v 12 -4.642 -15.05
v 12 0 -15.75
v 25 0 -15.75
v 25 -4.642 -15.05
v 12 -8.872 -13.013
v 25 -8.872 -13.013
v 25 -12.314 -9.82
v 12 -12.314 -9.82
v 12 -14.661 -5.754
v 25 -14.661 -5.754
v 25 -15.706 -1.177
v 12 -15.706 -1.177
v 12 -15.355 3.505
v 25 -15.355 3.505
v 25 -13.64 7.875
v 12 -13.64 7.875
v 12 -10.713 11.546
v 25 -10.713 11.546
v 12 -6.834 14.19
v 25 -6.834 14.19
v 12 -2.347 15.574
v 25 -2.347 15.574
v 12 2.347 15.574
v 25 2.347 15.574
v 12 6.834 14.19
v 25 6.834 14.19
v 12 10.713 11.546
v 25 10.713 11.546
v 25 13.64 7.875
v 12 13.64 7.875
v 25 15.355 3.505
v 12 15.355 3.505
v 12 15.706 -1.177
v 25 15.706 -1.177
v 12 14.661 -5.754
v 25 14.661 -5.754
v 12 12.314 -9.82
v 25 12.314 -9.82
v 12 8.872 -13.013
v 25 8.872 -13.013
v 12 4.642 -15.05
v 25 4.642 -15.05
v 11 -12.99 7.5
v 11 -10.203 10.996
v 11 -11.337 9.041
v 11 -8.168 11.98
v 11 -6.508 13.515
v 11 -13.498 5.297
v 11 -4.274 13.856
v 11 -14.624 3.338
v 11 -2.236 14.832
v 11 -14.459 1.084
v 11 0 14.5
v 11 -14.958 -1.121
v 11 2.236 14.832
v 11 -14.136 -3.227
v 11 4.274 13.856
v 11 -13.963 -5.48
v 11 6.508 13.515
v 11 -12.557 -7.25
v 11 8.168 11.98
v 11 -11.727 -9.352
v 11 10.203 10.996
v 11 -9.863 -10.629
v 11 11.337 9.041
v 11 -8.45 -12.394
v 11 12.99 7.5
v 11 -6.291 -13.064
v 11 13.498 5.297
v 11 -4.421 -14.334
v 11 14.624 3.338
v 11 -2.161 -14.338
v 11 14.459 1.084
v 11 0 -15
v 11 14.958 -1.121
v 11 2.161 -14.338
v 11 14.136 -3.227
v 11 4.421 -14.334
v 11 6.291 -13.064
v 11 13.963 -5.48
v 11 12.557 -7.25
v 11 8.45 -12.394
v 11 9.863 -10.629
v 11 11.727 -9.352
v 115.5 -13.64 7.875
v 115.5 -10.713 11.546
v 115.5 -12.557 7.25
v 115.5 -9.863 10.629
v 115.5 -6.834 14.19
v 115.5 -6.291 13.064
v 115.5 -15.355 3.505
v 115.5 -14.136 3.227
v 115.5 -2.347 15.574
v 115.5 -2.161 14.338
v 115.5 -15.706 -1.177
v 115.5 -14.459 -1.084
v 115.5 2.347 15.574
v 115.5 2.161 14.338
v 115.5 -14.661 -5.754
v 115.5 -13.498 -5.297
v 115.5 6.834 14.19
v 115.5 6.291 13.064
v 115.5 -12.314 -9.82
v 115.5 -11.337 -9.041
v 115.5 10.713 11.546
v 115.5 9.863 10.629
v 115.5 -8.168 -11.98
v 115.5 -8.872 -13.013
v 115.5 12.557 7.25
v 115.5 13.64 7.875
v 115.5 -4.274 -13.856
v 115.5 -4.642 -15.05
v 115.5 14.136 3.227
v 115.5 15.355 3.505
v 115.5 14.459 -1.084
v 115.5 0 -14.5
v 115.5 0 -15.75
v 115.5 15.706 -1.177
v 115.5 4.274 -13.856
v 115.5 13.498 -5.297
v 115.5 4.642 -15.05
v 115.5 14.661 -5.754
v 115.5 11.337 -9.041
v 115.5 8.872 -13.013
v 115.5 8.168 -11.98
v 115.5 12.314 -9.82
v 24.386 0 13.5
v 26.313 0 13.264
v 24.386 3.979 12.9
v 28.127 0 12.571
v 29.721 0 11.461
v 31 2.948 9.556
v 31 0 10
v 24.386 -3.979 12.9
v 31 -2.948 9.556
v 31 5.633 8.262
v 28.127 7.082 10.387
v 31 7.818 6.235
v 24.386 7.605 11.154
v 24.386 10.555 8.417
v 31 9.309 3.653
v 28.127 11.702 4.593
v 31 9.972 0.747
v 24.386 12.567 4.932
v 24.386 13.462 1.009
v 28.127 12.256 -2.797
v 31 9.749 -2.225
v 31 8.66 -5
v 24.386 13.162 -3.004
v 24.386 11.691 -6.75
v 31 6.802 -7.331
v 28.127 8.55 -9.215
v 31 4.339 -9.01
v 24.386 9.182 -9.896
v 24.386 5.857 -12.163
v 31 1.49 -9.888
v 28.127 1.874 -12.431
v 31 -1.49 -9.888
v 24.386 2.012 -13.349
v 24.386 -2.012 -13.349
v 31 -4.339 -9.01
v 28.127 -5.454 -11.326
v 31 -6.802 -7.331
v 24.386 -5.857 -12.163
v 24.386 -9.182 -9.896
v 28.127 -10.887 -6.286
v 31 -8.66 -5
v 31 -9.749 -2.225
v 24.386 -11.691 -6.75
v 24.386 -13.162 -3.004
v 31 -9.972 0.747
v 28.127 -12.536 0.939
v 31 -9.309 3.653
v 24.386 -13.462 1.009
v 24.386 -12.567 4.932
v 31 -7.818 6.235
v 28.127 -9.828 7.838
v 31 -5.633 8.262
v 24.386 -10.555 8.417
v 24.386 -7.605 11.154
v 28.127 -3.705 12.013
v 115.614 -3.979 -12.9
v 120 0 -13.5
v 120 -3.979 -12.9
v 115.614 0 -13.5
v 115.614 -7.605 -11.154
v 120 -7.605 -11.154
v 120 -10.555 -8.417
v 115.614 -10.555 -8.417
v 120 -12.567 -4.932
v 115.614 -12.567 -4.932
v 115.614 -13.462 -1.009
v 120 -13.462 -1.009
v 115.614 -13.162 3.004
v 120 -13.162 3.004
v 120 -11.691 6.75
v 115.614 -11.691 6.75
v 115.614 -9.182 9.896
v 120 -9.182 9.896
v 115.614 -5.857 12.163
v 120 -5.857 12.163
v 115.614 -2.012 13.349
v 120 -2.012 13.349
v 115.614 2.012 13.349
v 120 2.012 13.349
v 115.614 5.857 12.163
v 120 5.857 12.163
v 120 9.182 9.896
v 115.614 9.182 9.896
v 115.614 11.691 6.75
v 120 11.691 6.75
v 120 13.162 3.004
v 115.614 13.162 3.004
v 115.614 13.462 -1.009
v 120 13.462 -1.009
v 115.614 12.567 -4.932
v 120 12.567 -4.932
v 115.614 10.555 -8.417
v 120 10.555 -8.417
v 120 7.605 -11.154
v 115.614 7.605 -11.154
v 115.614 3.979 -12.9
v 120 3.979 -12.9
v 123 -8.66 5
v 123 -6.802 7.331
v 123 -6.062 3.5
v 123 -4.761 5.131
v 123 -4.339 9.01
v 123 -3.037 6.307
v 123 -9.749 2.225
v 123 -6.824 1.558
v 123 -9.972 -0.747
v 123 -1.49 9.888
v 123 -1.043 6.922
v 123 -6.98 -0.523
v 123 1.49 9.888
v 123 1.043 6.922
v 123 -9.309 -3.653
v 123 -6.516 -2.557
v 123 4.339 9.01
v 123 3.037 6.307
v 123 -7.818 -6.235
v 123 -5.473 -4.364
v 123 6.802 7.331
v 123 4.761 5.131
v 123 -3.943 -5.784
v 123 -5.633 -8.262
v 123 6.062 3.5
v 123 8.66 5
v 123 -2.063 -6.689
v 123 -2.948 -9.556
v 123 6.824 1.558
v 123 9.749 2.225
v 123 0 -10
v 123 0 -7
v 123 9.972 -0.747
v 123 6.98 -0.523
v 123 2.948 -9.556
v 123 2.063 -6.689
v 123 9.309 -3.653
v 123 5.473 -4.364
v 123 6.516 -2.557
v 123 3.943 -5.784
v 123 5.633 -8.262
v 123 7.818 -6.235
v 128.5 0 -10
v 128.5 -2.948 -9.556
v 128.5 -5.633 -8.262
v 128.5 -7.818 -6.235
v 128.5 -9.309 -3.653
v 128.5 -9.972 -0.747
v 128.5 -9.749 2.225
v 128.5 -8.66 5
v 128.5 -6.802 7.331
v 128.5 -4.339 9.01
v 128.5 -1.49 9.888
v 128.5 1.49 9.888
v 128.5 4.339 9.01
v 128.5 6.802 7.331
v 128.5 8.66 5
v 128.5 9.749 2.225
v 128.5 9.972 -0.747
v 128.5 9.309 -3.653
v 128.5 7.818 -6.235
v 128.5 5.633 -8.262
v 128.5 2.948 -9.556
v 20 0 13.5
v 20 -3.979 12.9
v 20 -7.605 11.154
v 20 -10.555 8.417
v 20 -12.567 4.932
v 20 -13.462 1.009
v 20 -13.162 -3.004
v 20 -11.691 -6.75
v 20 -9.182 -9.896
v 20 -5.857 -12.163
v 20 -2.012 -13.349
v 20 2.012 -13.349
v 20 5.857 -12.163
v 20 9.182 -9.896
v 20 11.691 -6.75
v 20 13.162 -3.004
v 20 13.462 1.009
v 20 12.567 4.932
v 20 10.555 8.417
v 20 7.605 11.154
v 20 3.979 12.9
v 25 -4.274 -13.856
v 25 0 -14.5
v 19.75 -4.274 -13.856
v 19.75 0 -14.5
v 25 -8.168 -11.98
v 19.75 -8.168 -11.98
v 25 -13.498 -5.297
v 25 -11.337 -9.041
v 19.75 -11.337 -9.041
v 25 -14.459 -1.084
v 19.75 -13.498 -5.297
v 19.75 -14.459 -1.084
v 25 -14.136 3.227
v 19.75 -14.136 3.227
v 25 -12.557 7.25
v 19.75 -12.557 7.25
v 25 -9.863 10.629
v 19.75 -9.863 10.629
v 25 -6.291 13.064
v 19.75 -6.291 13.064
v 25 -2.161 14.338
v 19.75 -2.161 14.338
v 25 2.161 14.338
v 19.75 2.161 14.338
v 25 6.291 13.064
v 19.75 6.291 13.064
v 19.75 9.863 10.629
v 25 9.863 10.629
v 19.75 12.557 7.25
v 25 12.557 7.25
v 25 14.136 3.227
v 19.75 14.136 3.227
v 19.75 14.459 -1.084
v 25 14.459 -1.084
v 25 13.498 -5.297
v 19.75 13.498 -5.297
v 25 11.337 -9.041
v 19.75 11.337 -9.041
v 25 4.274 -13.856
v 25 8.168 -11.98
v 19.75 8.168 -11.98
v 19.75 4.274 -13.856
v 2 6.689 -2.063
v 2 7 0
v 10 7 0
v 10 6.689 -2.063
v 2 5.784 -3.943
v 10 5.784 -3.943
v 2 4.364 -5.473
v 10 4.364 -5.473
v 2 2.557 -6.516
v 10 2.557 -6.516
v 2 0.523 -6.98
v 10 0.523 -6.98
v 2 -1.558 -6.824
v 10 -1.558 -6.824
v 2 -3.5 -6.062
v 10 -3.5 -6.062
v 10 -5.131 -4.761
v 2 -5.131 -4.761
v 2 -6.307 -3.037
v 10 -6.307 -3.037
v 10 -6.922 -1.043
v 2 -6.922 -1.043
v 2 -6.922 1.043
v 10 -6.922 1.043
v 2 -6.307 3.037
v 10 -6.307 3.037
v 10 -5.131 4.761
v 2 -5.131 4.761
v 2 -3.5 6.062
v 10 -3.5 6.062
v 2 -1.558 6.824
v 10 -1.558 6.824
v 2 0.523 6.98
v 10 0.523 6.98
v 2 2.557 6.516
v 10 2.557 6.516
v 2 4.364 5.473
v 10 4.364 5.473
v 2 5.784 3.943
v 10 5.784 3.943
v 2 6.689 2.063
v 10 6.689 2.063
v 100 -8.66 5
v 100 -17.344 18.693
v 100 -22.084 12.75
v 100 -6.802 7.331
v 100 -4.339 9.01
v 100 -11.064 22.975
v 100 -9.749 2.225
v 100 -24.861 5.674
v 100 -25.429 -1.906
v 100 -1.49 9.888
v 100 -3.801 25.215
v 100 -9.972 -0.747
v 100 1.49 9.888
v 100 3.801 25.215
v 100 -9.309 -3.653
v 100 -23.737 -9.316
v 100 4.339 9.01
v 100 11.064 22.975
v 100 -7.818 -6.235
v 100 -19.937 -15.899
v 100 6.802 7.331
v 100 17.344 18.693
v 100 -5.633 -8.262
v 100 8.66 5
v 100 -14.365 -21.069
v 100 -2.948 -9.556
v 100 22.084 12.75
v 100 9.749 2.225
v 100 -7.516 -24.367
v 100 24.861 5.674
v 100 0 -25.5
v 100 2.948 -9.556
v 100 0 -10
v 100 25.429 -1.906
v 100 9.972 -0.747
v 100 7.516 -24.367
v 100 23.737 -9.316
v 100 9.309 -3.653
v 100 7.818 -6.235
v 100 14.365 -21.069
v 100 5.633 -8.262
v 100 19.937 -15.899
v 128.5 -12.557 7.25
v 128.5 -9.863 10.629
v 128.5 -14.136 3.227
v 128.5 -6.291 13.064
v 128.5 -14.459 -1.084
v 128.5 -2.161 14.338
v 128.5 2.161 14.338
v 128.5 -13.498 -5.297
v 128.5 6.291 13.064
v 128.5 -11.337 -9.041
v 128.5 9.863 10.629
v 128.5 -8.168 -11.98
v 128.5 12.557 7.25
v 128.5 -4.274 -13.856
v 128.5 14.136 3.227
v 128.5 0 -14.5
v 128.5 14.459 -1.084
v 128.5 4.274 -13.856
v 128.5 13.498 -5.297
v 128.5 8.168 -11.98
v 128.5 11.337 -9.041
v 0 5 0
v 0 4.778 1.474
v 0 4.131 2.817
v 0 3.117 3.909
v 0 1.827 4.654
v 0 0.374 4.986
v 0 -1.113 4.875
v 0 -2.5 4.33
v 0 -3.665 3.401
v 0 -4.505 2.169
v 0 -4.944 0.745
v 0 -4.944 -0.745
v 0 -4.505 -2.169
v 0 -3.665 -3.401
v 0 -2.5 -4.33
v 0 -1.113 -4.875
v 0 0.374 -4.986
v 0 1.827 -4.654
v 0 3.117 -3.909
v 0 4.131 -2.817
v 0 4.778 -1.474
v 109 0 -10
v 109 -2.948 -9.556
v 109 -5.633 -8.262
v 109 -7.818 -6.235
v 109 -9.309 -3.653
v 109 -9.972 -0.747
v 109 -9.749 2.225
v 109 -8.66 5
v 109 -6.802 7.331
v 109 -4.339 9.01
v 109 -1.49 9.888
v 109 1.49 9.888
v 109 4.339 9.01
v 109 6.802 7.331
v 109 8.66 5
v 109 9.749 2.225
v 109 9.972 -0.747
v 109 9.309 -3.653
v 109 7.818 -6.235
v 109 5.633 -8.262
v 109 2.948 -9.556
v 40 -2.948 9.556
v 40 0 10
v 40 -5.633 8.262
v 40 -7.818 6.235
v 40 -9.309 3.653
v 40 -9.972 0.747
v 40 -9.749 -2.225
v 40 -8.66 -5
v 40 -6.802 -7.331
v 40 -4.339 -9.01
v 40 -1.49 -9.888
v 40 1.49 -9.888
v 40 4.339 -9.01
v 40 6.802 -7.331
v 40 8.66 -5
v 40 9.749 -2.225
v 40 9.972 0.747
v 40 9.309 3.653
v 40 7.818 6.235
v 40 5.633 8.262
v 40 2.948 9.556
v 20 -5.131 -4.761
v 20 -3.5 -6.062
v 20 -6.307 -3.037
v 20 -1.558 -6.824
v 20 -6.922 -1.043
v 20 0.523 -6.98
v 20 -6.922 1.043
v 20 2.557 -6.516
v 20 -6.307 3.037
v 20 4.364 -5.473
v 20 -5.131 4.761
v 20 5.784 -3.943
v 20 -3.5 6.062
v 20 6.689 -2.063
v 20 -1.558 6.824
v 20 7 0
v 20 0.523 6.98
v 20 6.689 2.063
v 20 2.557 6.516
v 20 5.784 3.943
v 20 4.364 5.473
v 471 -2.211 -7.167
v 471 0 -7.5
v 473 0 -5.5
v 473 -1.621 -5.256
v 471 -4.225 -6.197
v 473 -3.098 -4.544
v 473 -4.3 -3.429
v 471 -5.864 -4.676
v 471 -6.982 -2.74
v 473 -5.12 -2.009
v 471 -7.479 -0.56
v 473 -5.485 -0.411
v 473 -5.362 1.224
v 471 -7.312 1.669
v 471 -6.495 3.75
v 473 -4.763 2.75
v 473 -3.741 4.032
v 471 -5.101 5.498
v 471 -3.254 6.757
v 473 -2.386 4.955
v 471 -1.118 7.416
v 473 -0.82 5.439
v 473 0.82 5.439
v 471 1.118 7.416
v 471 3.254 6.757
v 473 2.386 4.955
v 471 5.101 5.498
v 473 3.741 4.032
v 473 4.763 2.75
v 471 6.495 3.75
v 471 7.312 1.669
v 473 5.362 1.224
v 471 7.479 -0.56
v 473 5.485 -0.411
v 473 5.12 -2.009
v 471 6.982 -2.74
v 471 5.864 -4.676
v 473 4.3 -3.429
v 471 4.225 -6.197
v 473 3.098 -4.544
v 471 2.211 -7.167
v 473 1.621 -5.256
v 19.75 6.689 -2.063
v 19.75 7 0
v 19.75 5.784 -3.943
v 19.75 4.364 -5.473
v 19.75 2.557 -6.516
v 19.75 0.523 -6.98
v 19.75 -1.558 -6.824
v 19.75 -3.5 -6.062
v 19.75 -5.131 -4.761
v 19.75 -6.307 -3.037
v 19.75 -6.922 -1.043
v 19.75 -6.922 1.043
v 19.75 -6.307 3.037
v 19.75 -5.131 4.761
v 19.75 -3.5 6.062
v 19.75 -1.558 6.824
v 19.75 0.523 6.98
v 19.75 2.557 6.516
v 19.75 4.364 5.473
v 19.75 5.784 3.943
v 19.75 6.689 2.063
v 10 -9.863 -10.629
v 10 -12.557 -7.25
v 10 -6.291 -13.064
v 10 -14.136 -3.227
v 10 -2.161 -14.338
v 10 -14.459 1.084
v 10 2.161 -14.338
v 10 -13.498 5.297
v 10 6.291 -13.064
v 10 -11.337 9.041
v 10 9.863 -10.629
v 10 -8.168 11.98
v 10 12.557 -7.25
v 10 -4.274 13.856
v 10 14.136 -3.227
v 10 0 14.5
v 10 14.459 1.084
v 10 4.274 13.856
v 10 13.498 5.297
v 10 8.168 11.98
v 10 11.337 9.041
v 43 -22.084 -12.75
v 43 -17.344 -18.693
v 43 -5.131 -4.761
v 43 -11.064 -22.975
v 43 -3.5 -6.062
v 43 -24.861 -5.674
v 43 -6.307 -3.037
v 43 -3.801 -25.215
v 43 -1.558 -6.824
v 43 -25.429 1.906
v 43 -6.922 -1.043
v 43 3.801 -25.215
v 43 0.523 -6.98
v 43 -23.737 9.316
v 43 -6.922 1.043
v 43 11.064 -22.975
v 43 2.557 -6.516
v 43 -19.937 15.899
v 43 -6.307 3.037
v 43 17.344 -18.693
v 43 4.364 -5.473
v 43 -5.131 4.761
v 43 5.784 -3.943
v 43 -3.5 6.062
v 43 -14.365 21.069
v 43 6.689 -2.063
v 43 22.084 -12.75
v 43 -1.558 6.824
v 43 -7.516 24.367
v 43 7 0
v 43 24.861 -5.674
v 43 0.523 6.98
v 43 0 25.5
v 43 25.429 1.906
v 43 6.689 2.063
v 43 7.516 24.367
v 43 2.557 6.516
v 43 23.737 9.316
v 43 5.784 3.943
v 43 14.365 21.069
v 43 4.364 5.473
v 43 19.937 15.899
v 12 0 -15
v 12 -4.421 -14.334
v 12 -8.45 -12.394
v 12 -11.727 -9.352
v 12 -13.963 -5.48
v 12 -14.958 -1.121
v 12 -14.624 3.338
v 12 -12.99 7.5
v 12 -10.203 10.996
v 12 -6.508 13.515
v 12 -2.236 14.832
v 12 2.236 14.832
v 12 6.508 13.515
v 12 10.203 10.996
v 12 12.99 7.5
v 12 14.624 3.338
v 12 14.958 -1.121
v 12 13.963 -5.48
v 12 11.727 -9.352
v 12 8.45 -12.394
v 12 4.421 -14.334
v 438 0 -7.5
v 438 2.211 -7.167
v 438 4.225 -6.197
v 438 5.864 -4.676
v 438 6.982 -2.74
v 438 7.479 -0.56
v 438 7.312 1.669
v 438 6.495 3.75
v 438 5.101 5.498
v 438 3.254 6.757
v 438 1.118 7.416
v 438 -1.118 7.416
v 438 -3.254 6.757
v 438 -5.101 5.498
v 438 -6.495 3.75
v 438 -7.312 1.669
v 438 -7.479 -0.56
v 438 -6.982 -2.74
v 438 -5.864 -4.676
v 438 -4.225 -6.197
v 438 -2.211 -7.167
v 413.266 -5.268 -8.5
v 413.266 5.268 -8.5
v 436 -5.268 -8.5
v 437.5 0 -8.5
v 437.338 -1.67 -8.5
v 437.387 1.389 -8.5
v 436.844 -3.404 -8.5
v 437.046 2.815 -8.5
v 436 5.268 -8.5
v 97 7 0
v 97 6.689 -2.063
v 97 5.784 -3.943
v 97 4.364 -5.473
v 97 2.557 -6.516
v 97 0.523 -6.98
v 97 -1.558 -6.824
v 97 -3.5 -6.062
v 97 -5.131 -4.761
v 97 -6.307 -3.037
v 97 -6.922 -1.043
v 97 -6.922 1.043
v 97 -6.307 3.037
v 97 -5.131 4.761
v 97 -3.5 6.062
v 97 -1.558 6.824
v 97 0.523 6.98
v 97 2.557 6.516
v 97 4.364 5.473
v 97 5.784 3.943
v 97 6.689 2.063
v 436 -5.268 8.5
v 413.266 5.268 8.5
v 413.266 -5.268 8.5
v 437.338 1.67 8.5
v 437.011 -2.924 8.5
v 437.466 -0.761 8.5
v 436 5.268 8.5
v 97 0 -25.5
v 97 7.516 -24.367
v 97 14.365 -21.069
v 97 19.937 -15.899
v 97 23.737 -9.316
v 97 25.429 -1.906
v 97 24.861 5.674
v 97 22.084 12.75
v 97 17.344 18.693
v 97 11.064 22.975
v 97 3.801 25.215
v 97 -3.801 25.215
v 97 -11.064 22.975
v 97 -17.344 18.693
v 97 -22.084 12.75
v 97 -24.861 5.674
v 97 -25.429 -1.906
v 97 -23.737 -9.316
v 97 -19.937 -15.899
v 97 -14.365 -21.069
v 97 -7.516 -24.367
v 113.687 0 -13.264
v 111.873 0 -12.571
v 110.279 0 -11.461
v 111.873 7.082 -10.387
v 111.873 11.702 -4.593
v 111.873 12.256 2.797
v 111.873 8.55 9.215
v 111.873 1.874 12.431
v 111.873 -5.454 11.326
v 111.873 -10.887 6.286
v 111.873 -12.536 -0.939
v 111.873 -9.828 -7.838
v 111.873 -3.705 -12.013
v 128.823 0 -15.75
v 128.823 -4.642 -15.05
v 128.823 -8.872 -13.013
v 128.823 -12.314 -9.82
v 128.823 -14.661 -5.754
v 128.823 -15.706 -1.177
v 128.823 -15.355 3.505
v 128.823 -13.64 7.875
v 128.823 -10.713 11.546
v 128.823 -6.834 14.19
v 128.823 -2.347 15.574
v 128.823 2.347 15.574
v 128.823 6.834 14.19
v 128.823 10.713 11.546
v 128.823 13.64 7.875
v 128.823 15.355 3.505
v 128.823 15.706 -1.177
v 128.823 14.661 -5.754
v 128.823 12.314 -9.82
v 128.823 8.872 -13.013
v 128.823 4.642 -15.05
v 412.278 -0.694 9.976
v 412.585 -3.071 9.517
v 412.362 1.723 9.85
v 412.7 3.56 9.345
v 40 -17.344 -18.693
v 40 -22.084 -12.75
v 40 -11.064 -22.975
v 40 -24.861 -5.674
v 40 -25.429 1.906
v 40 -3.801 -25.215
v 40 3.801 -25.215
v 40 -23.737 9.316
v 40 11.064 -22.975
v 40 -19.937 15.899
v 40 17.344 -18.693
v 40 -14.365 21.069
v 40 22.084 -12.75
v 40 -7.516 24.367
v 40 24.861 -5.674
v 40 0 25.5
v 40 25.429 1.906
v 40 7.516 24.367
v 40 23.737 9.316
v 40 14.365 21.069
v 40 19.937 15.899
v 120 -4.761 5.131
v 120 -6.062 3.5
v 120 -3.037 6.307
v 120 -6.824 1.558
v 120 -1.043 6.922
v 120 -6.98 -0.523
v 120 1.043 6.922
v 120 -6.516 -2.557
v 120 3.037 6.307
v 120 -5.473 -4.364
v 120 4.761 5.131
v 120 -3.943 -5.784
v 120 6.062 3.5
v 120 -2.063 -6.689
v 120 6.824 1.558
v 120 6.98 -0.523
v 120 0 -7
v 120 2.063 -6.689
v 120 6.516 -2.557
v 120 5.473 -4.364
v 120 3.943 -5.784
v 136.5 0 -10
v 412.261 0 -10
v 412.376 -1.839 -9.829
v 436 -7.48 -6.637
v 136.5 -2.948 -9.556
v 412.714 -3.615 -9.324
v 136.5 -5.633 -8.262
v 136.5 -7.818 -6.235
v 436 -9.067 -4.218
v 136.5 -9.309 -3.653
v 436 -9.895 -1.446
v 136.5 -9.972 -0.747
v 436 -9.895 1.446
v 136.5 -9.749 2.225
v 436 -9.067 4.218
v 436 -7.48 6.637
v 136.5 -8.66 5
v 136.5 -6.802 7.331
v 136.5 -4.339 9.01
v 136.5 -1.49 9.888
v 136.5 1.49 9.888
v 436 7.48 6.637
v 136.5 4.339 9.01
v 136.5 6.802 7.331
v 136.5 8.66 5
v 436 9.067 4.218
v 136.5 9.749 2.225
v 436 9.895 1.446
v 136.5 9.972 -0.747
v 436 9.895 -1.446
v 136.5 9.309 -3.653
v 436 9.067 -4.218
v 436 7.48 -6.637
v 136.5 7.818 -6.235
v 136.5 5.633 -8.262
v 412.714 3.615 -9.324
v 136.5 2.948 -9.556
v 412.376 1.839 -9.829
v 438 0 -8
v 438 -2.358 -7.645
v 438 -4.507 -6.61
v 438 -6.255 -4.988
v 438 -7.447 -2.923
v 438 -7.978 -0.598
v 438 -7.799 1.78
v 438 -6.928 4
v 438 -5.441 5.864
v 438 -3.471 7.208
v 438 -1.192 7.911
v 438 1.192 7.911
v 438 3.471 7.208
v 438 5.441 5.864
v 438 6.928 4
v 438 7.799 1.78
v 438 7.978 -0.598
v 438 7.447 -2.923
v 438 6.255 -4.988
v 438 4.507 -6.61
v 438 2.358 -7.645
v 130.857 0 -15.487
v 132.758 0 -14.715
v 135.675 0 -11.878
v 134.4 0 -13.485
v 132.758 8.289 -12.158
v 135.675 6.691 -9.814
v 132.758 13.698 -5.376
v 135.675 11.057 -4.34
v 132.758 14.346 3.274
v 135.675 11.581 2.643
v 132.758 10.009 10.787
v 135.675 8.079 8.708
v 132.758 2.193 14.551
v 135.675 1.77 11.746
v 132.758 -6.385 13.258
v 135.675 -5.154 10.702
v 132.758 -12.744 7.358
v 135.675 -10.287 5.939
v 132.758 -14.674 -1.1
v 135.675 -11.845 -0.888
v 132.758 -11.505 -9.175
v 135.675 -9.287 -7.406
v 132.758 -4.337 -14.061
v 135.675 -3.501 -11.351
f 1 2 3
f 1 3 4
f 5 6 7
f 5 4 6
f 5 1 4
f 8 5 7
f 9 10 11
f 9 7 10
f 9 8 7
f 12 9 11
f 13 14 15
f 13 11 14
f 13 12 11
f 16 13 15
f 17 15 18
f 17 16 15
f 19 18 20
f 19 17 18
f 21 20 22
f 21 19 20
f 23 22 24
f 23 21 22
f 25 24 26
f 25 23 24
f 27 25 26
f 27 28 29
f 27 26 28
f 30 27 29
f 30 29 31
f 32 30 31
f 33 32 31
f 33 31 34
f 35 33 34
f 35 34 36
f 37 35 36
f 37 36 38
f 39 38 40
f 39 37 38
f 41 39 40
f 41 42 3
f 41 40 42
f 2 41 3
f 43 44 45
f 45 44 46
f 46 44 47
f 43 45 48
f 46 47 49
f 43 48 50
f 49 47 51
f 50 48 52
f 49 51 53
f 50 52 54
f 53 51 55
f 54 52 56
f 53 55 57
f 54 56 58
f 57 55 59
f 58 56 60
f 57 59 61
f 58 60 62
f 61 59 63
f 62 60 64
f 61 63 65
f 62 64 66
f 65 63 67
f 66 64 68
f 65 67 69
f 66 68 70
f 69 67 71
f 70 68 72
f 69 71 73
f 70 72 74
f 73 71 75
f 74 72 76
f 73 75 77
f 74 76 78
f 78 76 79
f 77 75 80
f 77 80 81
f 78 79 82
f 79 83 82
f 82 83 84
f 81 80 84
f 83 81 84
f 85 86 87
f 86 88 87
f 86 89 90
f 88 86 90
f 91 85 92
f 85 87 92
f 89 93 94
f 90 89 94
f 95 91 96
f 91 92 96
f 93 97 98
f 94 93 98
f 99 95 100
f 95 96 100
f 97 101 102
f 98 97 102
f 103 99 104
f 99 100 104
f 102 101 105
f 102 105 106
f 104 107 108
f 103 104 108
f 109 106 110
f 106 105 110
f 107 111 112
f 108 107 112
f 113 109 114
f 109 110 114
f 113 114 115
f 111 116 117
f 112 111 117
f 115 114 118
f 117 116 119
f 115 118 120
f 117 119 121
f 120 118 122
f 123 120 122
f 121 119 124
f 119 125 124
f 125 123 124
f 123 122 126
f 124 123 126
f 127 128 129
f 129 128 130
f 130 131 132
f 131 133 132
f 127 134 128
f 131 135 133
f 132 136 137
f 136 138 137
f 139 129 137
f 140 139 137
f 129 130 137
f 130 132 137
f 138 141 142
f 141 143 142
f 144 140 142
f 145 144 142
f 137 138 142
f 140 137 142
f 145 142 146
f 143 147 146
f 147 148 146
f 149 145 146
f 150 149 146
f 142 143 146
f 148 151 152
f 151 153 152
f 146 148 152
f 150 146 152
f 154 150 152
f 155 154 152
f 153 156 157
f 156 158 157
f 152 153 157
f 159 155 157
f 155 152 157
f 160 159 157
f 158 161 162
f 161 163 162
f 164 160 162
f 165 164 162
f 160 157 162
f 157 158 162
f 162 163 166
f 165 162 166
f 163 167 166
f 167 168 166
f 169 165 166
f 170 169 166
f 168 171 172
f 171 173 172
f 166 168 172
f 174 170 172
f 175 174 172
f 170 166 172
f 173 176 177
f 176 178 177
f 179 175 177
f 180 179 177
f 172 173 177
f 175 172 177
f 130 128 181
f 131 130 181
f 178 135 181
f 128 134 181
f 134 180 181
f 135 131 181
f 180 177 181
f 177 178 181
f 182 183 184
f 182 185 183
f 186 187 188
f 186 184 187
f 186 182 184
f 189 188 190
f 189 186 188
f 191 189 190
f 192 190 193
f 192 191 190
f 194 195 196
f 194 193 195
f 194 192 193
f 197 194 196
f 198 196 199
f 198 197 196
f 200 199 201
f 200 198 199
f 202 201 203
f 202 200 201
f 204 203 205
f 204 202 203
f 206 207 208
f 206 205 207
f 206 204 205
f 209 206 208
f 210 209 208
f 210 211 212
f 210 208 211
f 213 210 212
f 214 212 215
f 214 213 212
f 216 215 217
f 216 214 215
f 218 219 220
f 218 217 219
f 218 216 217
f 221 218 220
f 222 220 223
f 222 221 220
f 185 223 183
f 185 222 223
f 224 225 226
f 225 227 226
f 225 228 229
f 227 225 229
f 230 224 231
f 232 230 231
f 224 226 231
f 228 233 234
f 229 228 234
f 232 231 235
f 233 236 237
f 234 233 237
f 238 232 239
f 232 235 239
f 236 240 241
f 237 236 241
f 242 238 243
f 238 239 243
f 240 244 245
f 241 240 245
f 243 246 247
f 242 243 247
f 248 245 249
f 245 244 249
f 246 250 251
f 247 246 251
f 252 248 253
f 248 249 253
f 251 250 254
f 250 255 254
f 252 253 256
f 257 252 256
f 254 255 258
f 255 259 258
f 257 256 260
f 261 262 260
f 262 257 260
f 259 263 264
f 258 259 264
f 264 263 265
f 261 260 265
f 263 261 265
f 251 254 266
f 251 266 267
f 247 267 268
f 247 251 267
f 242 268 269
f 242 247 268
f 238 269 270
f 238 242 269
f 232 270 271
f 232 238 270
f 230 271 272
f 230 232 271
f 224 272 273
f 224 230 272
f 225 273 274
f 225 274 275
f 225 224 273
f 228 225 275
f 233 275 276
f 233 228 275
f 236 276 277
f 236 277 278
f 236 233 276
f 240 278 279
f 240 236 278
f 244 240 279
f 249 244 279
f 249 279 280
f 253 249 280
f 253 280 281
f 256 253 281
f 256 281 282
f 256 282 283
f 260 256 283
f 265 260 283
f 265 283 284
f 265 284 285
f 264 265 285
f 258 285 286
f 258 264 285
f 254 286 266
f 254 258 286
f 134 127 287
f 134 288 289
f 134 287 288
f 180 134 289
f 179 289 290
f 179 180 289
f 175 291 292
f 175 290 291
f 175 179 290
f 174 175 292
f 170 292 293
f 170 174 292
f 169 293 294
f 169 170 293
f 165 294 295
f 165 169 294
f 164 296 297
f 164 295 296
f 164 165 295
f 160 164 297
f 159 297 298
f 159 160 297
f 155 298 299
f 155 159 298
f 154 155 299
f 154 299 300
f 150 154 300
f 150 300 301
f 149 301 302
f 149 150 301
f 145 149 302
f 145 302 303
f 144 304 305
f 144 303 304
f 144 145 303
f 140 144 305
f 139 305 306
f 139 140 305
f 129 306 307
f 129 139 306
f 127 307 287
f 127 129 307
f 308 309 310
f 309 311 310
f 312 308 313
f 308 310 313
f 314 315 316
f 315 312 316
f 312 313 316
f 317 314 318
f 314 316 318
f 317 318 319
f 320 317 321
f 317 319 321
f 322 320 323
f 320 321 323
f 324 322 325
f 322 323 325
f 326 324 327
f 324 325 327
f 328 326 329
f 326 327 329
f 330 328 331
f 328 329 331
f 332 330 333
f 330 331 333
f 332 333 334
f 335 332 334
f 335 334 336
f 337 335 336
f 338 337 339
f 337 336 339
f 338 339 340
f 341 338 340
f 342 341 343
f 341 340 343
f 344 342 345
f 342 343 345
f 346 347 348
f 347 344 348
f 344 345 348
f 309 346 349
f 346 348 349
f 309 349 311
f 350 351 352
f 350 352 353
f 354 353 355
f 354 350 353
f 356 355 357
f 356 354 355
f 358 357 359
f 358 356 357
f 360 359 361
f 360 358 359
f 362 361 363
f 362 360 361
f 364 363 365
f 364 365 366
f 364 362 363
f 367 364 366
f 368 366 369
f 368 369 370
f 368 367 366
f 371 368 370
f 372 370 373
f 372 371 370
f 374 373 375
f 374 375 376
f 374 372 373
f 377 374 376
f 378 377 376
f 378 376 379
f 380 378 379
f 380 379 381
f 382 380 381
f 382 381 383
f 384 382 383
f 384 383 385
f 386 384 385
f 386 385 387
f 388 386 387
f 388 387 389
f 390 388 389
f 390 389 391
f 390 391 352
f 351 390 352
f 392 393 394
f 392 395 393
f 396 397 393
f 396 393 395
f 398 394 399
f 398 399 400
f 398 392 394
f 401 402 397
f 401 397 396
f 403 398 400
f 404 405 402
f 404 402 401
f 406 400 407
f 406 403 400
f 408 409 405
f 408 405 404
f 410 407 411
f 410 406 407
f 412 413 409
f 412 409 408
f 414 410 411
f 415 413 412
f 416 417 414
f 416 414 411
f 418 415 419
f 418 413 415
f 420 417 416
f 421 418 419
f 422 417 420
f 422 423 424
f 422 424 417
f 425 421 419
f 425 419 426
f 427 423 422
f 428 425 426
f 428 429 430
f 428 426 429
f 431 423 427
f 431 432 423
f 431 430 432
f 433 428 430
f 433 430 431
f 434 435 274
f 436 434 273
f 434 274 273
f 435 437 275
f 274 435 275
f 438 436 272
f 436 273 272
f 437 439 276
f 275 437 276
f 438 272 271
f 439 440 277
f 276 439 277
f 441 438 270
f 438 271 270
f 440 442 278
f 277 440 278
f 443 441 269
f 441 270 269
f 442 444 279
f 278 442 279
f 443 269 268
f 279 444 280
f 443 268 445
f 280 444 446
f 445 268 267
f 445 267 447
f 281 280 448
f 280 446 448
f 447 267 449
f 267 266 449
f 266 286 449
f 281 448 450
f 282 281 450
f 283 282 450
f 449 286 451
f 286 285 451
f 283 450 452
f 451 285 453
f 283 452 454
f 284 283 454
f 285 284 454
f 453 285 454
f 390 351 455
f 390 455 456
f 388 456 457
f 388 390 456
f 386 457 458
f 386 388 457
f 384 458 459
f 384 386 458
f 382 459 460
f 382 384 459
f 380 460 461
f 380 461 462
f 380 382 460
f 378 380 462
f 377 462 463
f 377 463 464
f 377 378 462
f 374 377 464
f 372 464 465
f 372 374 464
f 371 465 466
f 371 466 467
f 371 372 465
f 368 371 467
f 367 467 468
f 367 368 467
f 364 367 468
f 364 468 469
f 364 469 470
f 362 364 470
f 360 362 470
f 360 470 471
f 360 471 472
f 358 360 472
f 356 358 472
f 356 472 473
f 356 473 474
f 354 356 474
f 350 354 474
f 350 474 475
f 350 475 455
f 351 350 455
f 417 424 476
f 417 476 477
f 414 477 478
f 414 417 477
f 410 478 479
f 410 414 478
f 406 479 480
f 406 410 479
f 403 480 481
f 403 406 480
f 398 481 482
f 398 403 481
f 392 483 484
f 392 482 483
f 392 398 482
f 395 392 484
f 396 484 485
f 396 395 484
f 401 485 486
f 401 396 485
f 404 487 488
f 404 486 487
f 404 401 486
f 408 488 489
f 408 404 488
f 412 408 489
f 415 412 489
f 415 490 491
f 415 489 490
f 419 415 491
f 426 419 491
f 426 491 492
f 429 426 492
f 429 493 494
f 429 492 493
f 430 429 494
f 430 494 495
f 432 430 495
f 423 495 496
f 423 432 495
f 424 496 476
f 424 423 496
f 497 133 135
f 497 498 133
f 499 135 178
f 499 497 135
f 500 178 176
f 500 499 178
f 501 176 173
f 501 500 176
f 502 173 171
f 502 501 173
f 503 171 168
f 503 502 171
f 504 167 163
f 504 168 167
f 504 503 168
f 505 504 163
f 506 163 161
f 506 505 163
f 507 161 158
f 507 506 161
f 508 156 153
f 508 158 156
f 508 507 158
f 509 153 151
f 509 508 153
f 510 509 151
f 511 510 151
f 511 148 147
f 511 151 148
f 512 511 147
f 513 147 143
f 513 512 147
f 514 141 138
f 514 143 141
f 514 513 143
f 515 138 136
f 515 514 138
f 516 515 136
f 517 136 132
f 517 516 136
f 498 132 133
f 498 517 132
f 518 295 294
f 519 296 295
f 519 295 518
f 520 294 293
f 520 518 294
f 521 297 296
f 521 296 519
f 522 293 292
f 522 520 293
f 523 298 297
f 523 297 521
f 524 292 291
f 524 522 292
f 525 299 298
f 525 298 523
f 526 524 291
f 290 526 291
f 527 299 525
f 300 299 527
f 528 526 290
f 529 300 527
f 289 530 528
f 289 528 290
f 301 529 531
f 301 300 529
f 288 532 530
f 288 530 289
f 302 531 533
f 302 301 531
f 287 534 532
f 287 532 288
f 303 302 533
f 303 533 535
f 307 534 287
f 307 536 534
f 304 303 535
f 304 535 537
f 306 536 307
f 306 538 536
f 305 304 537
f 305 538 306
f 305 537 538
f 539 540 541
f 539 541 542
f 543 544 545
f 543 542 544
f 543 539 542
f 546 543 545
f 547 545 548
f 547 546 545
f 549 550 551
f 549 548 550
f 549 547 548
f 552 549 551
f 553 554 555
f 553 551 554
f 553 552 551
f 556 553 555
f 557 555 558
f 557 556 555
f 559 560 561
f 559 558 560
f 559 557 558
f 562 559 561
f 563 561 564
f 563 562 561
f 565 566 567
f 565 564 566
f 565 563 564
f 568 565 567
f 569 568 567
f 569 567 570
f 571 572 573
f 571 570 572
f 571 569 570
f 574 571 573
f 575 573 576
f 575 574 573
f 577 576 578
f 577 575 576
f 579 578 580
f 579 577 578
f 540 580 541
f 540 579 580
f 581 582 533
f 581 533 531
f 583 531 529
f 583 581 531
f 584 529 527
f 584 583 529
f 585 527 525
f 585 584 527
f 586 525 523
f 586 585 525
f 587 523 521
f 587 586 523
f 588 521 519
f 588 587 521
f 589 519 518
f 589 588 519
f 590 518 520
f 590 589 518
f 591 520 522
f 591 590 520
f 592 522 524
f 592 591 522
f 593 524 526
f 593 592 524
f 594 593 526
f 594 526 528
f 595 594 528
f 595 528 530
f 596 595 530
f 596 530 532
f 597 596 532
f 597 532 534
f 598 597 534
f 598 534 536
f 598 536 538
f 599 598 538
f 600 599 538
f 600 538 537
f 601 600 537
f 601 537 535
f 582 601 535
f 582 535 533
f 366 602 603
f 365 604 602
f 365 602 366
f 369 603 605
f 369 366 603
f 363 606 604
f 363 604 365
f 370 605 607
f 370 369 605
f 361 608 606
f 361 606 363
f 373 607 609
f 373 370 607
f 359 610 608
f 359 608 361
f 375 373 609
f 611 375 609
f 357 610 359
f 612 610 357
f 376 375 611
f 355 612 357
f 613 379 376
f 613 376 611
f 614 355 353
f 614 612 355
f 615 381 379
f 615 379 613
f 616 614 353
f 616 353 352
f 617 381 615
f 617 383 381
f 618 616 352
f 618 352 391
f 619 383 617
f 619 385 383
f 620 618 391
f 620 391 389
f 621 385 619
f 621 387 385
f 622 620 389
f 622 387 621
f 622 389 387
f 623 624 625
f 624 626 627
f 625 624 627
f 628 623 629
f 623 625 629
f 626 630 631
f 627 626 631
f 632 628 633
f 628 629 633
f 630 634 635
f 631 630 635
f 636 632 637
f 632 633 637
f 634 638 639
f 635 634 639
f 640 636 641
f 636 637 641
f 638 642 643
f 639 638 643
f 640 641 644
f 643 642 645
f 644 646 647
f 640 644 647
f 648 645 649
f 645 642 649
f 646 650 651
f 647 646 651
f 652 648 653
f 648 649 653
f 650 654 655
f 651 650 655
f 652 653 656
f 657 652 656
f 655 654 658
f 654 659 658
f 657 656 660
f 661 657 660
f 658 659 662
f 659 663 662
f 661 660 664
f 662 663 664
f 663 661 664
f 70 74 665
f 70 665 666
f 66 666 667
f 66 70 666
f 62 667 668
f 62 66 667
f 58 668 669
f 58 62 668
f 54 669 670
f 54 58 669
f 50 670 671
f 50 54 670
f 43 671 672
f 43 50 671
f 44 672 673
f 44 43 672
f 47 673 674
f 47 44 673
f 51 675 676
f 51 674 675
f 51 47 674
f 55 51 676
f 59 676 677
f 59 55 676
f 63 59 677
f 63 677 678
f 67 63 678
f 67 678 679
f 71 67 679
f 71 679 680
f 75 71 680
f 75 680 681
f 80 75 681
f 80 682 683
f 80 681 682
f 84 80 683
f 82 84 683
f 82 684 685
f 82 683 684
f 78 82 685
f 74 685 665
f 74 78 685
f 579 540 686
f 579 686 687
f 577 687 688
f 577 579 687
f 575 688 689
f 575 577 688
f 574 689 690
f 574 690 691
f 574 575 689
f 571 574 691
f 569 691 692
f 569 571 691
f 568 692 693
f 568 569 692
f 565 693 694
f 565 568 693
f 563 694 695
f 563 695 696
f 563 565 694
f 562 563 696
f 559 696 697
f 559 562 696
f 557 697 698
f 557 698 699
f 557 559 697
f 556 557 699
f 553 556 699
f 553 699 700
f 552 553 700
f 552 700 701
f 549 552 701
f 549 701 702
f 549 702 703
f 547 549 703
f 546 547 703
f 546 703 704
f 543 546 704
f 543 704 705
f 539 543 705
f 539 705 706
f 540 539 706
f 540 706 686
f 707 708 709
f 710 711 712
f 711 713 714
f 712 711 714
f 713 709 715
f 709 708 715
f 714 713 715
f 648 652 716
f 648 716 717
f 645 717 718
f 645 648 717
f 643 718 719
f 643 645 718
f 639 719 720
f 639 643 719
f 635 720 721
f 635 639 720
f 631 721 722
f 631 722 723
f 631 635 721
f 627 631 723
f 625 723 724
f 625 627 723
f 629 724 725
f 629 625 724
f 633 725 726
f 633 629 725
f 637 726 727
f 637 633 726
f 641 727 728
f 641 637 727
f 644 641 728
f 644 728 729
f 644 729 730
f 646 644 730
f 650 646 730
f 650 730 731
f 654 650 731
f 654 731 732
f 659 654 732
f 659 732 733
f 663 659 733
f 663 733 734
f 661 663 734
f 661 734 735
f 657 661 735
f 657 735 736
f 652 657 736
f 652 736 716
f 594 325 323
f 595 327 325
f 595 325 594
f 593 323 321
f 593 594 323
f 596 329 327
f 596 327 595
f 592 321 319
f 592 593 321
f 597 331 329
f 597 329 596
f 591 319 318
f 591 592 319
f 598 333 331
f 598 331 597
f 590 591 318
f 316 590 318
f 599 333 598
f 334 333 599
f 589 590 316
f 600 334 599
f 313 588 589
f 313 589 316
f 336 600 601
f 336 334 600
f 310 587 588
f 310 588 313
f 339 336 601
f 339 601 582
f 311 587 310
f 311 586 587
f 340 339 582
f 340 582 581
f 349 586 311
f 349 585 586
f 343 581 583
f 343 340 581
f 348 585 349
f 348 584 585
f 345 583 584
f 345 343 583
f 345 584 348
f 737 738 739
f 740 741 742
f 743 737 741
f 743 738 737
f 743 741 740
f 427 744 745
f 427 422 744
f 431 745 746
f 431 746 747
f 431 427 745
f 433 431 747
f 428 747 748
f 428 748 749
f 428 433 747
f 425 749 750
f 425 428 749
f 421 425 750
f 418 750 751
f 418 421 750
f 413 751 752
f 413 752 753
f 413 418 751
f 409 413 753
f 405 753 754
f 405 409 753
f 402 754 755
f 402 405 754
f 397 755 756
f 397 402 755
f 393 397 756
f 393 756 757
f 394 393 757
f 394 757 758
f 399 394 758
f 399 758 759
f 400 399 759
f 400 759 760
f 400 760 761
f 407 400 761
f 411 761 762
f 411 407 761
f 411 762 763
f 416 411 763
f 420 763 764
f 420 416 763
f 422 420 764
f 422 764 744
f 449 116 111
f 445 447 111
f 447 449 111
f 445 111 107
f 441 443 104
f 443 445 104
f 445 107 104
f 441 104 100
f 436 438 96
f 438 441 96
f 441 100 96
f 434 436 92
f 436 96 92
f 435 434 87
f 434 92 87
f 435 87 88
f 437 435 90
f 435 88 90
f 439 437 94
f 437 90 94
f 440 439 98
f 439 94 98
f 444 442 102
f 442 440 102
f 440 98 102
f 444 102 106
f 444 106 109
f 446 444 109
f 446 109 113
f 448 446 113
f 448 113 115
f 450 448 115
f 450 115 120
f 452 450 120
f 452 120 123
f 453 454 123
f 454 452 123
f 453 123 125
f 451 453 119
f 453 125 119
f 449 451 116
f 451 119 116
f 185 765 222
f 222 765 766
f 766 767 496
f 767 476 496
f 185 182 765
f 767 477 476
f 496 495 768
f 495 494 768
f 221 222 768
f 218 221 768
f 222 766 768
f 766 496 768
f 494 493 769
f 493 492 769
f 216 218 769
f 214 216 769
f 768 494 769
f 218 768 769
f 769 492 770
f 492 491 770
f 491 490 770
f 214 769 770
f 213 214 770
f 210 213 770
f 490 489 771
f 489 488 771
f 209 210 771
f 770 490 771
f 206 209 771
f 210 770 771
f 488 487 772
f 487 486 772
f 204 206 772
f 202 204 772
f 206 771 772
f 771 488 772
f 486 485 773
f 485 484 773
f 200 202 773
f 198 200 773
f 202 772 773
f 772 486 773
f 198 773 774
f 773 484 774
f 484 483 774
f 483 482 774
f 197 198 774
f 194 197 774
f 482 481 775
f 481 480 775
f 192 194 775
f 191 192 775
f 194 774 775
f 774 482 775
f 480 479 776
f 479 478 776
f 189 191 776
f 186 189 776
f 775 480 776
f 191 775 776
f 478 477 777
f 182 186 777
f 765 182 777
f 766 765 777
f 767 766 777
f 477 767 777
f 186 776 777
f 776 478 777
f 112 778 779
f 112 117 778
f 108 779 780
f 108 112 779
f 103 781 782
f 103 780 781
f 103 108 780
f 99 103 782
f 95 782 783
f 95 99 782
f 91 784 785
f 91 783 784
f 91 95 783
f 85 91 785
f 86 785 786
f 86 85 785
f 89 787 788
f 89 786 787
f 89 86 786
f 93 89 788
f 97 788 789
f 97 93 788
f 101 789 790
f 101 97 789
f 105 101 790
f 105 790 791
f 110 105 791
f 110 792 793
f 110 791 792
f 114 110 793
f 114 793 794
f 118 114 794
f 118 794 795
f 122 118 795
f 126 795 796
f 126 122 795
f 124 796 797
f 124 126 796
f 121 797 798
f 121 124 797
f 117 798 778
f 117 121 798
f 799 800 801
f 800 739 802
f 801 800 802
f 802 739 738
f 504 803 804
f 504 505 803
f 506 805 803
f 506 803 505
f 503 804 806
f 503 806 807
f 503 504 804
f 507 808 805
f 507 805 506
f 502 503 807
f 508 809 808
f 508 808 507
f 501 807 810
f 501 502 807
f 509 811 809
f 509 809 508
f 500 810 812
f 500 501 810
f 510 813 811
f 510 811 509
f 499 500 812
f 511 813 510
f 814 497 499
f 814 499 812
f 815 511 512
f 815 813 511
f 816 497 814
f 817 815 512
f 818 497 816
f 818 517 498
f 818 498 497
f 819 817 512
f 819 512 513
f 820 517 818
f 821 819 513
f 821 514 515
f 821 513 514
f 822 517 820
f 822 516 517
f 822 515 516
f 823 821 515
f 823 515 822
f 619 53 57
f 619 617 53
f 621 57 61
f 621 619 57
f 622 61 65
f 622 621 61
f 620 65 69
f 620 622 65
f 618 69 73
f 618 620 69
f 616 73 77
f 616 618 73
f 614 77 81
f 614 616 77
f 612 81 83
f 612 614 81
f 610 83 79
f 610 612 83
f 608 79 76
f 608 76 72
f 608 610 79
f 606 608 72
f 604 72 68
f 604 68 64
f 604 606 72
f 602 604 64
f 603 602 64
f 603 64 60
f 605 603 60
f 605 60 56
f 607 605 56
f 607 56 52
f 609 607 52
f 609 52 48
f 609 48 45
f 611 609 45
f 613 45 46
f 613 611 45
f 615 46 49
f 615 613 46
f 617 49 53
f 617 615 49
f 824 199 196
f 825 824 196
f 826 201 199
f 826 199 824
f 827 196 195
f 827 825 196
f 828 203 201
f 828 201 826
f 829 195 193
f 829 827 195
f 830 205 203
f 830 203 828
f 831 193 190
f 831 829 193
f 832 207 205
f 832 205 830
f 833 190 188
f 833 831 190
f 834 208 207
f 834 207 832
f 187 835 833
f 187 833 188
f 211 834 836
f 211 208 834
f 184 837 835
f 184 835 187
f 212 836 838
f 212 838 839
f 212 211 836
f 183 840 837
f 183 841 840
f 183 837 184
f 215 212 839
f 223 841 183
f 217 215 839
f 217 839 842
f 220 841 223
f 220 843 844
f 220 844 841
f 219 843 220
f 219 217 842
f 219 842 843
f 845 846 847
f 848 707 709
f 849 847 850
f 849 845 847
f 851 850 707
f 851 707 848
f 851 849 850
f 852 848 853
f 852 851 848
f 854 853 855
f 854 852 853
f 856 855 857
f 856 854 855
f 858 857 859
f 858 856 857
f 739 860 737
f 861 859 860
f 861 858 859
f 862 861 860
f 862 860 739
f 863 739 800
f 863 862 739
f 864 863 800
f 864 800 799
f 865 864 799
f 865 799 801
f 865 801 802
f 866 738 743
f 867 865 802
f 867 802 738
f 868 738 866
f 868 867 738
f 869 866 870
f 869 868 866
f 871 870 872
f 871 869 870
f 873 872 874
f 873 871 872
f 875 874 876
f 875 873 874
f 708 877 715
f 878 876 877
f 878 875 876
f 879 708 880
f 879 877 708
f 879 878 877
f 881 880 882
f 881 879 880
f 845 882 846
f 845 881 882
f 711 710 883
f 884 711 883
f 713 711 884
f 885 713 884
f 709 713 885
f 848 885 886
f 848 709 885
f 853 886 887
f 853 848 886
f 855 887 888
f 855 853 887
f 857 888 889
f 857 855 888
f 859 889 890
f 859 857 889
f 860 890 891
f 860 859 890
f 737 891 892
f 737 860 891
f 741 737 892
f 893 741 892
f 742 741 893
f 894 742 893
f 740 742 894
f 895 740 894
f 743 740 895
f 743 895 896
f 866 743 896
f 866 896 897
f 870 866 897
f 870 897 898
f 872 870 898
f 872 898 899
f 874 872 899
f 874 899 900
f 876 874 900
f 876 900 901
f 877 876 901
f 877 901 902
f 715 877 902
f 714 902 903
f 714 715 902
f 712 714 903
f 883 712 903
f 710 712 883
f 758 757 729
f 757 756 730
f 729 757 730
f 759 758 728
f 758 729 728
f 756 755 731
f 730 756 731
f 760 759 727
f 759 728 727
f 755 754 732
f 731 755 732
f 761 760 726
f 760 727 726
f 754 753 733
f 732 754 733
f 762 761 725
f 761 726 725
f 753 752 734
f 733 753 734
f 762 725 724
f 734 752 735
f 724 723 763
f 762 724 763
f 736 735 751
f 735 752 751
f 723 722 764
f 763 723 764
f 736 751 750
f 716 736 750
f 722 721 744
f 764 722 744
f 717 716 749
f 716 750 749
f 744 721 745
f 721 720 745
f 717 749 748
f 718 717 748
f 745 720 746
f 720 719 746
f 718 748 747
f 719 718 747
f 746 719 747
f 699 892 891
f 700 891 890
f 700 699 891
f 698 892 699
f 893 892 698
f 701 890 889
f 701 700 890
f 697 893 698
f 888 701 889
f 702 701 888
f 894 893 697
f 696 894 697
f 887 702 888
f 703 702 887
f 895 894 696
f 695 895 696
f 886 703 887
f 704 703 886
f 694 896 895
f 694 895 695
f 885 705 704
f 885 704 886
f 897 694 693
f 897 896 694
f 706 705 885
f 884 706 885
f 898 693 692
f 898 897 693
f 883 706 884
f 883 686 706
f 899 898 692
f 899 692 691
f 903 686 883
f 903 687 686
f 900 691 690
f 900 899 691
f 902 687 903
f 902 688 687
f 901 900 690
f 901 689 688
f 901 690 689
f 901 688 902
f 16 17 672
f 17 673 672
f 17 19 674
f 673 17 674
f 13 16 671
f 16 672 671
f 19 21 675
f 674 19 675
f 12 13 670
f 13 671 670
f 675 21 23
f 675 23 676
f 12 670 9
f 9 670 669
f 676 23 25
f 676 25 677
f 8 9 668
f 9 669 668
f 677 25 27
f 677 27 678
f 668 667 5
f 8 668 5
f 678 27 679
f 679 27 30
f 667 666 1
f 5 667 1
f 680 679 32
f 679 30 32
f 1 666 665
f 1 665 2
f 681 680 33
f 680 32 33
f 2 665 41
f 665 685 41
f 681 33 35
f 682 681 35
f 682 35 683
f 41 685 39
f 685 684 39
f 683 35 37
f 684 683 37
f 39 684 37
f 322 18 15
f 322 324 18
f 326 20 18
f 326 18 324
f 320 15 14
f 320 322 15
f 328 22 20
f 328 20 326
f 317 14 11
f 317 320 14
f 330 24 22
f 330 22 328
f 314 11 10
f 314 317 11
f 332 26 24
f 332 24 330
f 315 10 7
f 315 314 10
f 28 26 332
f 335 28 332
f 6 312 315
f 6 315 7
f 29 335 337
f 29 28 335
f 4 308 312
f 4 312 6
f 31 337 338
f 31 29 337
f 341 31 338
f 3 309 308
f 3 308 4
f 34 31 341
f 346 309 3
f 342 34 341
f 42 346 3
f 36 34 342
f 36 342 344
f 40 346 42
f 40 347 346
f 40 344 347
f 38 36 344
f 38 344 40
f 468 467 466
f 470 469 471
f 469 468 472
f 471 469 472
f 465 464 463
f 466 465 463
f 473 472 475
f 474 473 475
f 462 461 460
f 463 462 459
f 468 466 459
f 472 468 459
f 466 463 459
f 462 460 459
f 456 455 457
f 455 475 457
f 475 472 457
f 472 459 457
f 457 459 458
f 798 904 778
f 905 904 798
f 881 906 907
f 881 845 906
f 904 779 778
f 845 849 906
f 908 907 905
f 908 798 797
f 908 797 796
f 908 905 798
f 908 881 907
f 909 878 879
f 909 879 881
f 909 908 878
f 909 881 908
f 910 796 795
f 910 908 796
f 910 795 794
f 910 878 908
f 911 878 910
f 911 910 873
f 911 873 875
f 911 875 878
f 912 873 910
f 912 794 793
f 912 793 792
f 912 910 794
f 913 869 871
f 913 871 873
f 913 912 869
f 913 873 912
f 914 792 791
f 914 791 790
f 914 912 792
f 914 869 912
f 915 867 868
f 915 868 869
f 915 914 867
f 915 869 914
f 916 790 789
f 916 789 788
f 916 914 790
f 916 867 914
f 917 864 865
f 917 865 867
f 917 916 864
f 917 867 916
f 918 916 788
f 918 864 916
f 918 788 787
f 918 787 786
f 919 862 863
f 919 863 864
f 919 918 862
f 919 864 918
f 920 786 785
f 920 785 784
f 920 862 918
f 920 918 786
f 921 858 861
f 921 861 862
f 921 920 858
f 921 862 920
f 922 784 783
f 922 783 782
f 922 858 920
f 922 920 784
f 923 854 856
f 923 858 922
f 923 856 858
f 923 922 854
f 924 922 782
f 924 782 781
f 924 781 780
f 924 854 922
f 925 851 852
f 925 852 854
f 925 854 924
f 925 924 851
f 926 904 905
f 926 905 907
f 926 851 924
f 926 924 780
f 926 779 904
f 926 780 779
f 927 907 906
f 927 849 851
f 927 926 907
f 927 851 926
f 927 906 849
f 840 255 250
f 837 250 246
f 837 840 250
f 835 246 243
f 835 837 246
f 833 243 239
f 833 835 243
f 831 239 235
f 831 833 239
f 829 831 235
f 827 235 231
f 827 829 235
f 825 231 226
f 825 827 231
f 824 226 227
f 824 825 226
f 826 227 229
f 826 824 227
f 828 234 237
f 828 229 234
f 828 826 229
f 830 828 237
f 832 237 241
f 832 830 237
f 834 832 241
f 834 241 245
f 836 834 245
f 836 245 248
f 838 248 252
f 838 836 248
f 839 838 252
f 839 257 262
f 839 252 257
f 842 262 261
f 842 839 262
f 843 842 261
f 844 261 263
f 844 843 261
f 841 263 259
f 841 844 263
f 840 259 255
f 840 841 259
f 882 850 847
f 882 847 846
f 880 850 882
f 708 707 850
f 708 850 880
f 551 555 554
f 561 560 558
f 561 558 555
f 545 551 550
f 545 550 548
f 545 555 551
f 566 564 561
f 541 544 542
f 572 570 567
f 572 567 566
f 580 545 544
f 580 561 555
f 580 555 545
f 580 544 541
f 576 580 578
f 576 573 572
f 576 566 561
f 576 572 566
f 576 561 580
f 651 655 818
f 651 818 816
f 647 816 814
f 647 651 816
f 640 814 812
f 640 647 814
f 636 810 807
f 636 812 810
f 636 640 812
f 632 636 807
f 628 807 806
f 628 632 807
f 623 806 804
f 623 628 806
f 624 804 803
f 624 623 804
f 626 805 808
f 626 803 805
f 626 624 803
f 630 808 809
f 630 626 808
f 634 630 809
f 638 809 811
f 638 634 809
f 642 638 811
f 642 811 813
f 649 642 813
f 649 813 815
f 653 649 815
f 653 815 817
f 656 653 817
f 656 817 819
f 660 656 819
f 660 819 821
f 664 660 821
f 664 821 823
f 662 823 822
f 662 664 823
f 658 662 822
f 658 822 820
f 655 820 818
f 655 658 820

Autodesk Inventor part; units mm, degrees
sketch "Szkic1" plane through (0, 0, 0) normal (1, 0, 0) x (0, 1, 0)
  circle A0 centre (0, 0) radius 7
  dimension "d0" = 14
extrude "Wyciągnięcie proste1" add sketch "Szkic1" along normal blind 100
sketch "Szkic2" plane through (100, 0, 0) normal (1, 0, 0) x (0, 0, -1)
  circle A0 centre (0, 0) radius 25.5
  dimension "d3" = 51
extrude "Wyciągnięcie proste2" add sketch "Szkic2" against normal blind 3
ref_plane "Płaszczyzna konstrukcyjna1" through (43, 0, 0) normal (-1, 0, 0) x (0, 0, 1)
sketch "Szkic3" plane through (43, 0, 0) normal (-1, 0, 0) x (0, 0, 1)
  circle A0 centre (0, 0) radius 25.5
extrude "Wyciągnięcie proste3" add sketch "Szkic3" along normal blind 3
sketch "Szkic4" plane through (40, 0, 0) normal (-1, 0, 0) x (0, 0, 1)
  circle A0 centre (0, 0) radius 10
  dimension "d9" = 20
extrude "Wyciągnięcie proste4" add sketch "Szkic4" along normal blind 9
sketch "Szkic5" plane through (31, 0, 0) normal (-1, 0, 0) x (0, 0, 1)
  circle A0 centre (0, 0) radius 13.5
  dimension "d12" = 27
extrude "Wyciągnięcie proste5" add sketch "Szkic5" along normal blind 11
fillet "Zaokrąglenie1" radius 8 1 edges at (31, 0, -13.5)
ref_plane "Płaszczyzna konstrukcyjna2" through (10, 0, 0) normal (-1, 0, 0) x (0, 0, 1)
sketch "Szkic6" plane through (10, 0, 0) normal (-1, 0, 0) x (0, 0, 1)
  circle A0 centre (0, 0) radius 14.5
  dimension "d19" = 29
extrude "Wyciągnięcie proste6" add sketch "Szkic6" against normal blind 1
sketch "Szkic7" plane through (11, 0, 0) normal (1, 0, 0) x (0, 0, -1)
  circle A0 centre (0, 0) radius 15
  dimension "d22" = 30
extrude "Wyciągnięcie proste7" add sketch "Szkic7" along normal blind 1
sketch "Szkic8" plane through (12, 0, 0) normal (1, 0, 0) x (0, 0, -1)
  circle A0 centre (0, 0) radius 7 projected
  circle A1 centre (0, 0) radius 15.75
  circle A2 centre (0, 0) radius 13.5 projected
  circle A3 centre (0, 0) radius 14.5
  dimension "d25" = 31.5
extrude "Wyciągnięcie proste8" add sketch "Szkic8" along normal blind 13 contours A1
extrude "Wyciągnięcie proste9" add sketch "Szkic8" along normal blind 7.75 contours A0 | A2 | A3
sketch "Szkic9" plane through (100, 0, 0) normal (1, 0, 0) x (0, 0, -1)
  circle A0 centre (0, 0) radius 7
  circle A1 centre (0, 0) radius 10
  dimension "d30" = 14
  dimension "d33" = 20
extrude "Wyciągnięcie proste10" add sketch "Szkic9" along normal blind 23 contours A0
extrude "Wyciągnięcie proste11" add sketch "Szkic9" along normal blind 9
sketch "Szkic10" plane through (109, 0, 0) normal (1, 0, 0) x (0, 0, -1)
  circle A0 centre (0, 0) radius 25.5 projected
  circle A1 centre (0, 0) radius 13.5
  dimension "d36" = 27
extrude "Wyciągnięcie proste12" add sketch "Szkic10" along normal blind 11 contours A1
fillet "Zaokrąglenie2" radius 8 1 edges at (109, 0, 13.5)
ref_plane "Płaszczyzna konstrukcyjna3" through (115.5, 0, 0) normal (1, 0, 0) x (0, 0, -1)
sketch "Szkic11" plane through (115.5, 0, 0) normal (1, 0, 0) x (0, 0, -1)
  circle A0 centre (0, 0) radius 15.75
  circle A1 centre (0, 0) radius 14.5
  dimension "d41" = 31.5
  dimension "d42" = 29
extrude "Wyciągnięcie proste13" add sketch "Szkic11" along normal blind 13
sketch "Szkic12" plane through (123, 0, 0) normal (1, 0, 0) x (0, 0, -1)
  circle A0 centre (0, 0) radius 10
  dimension "d45" = 20
extrude "Wyciągnięcie proste14" add sketch "Szkic12" along normal blind 350
ref_plane "Płaszczyzna konstrukcyjna4" through (128.5, 0, 0) normal (1, 0, 0) x (0, 0, -1)
sketch "Szkic13" plane through (128.5, 0, 0) normal (1, 0, 0) x (0, 0, -1)
  circle A0 centre (0, 0) radius 15.75
extrude "Wyciągnięcie proste15" add sketch "Szkic13" along normal blind 8
fillet "Zaokrąglenie3" radius 8 1 edges at (136.5, 0, 15.75)
sketch "Szkic14" plane through (473, 0, 0) normal (1, 0, 0) x (0, 0, -1)
  circle A0 centre (0, 0) radius 7.5
  circle A1 centre (0, 0) radius 18.8953
  dimension "d52" = 15
extrude "Wyciągnięcie proste16" cut sketch "Szkic14" against normal blind 35
thread "Gwint2" size "M15x1.5" class "6g" standard "ANSI Metric M Profile" length 33
chamfer "Faza1" distance 2 angle 45 2 edges at (473, 0, 7.5) (438, 0, 10)
ref_plane "Płaszczyzna konstrukcyjna5" through (123, 10, 0) normal (0, 1, 0) x (-1, 0, 0)
sketch "Szkic15" plane through (123, 10, 0) normal (0, 1, 0) x (-1, 0, 0)
  line L0 (-290.266, 8.5) -> (-315.266, 8.5)
  line L1 (-315.266, 8.5) -> (-315.266, -8.5)
  line L2 (-315.266, -8.5) -> (-290.266, -8.5)
  line L3 (-290.266, -8.5) -> (-290.266, 8.5)
  line L4 (-290.266, 8.5) -> (-315.266, -8.5) construction
  line L5 (-315.266, 8.5) -> (-290.266, -8.5) construction
  line L6 (-317.1784, 11.3555) -> (-288.3535, 11.3555)
  line L7 (-288.3535, 11.3555) -> (-288.3535, -11.3555)
  line L8 (-288.3535, -11.3555) -> (-317.1784, -11.3555)
  line L9 (-317.1784, -11.3555) -> (-317.1784, 11.3555)
  line L10 (-317.1784, 11.3555) -> (-288.3535, -11.3555) construction
  line L11 (-288.3535, 11.3555) -> (-317.1784, -11.3555) construction
  line L12 (-290.266, -8.5) -> (-288.3535, -11.3555)
  line L13 (-290.266, 8.5) -> (-288.3535, 11.3555)
  line L14 (-315.266, -8.5) -> (-317.1784, -8.5)
  line L15 (-315.266, 8.5) -> (-317.1784, 8.5)
  point P0 (123, 0)
  point P1 (-302.766, 0)
  dimension "d60" = 25
  dimension "d61" = 17
extrude "Wyciągnięcie proste17" cut sketch "Szkic15" against normal blind 35 contours L0 L15 L9 L6 L13 | L12 L8 L9 L14 L2
thread "Gwint4" size "M14x2" class "6g" standard "ANSI Metric M Profile" length 33
chamfer "Faza3" distance 2 angle 45 1 edges at (0, -7, 0)
properties part number "tłoczysko"
